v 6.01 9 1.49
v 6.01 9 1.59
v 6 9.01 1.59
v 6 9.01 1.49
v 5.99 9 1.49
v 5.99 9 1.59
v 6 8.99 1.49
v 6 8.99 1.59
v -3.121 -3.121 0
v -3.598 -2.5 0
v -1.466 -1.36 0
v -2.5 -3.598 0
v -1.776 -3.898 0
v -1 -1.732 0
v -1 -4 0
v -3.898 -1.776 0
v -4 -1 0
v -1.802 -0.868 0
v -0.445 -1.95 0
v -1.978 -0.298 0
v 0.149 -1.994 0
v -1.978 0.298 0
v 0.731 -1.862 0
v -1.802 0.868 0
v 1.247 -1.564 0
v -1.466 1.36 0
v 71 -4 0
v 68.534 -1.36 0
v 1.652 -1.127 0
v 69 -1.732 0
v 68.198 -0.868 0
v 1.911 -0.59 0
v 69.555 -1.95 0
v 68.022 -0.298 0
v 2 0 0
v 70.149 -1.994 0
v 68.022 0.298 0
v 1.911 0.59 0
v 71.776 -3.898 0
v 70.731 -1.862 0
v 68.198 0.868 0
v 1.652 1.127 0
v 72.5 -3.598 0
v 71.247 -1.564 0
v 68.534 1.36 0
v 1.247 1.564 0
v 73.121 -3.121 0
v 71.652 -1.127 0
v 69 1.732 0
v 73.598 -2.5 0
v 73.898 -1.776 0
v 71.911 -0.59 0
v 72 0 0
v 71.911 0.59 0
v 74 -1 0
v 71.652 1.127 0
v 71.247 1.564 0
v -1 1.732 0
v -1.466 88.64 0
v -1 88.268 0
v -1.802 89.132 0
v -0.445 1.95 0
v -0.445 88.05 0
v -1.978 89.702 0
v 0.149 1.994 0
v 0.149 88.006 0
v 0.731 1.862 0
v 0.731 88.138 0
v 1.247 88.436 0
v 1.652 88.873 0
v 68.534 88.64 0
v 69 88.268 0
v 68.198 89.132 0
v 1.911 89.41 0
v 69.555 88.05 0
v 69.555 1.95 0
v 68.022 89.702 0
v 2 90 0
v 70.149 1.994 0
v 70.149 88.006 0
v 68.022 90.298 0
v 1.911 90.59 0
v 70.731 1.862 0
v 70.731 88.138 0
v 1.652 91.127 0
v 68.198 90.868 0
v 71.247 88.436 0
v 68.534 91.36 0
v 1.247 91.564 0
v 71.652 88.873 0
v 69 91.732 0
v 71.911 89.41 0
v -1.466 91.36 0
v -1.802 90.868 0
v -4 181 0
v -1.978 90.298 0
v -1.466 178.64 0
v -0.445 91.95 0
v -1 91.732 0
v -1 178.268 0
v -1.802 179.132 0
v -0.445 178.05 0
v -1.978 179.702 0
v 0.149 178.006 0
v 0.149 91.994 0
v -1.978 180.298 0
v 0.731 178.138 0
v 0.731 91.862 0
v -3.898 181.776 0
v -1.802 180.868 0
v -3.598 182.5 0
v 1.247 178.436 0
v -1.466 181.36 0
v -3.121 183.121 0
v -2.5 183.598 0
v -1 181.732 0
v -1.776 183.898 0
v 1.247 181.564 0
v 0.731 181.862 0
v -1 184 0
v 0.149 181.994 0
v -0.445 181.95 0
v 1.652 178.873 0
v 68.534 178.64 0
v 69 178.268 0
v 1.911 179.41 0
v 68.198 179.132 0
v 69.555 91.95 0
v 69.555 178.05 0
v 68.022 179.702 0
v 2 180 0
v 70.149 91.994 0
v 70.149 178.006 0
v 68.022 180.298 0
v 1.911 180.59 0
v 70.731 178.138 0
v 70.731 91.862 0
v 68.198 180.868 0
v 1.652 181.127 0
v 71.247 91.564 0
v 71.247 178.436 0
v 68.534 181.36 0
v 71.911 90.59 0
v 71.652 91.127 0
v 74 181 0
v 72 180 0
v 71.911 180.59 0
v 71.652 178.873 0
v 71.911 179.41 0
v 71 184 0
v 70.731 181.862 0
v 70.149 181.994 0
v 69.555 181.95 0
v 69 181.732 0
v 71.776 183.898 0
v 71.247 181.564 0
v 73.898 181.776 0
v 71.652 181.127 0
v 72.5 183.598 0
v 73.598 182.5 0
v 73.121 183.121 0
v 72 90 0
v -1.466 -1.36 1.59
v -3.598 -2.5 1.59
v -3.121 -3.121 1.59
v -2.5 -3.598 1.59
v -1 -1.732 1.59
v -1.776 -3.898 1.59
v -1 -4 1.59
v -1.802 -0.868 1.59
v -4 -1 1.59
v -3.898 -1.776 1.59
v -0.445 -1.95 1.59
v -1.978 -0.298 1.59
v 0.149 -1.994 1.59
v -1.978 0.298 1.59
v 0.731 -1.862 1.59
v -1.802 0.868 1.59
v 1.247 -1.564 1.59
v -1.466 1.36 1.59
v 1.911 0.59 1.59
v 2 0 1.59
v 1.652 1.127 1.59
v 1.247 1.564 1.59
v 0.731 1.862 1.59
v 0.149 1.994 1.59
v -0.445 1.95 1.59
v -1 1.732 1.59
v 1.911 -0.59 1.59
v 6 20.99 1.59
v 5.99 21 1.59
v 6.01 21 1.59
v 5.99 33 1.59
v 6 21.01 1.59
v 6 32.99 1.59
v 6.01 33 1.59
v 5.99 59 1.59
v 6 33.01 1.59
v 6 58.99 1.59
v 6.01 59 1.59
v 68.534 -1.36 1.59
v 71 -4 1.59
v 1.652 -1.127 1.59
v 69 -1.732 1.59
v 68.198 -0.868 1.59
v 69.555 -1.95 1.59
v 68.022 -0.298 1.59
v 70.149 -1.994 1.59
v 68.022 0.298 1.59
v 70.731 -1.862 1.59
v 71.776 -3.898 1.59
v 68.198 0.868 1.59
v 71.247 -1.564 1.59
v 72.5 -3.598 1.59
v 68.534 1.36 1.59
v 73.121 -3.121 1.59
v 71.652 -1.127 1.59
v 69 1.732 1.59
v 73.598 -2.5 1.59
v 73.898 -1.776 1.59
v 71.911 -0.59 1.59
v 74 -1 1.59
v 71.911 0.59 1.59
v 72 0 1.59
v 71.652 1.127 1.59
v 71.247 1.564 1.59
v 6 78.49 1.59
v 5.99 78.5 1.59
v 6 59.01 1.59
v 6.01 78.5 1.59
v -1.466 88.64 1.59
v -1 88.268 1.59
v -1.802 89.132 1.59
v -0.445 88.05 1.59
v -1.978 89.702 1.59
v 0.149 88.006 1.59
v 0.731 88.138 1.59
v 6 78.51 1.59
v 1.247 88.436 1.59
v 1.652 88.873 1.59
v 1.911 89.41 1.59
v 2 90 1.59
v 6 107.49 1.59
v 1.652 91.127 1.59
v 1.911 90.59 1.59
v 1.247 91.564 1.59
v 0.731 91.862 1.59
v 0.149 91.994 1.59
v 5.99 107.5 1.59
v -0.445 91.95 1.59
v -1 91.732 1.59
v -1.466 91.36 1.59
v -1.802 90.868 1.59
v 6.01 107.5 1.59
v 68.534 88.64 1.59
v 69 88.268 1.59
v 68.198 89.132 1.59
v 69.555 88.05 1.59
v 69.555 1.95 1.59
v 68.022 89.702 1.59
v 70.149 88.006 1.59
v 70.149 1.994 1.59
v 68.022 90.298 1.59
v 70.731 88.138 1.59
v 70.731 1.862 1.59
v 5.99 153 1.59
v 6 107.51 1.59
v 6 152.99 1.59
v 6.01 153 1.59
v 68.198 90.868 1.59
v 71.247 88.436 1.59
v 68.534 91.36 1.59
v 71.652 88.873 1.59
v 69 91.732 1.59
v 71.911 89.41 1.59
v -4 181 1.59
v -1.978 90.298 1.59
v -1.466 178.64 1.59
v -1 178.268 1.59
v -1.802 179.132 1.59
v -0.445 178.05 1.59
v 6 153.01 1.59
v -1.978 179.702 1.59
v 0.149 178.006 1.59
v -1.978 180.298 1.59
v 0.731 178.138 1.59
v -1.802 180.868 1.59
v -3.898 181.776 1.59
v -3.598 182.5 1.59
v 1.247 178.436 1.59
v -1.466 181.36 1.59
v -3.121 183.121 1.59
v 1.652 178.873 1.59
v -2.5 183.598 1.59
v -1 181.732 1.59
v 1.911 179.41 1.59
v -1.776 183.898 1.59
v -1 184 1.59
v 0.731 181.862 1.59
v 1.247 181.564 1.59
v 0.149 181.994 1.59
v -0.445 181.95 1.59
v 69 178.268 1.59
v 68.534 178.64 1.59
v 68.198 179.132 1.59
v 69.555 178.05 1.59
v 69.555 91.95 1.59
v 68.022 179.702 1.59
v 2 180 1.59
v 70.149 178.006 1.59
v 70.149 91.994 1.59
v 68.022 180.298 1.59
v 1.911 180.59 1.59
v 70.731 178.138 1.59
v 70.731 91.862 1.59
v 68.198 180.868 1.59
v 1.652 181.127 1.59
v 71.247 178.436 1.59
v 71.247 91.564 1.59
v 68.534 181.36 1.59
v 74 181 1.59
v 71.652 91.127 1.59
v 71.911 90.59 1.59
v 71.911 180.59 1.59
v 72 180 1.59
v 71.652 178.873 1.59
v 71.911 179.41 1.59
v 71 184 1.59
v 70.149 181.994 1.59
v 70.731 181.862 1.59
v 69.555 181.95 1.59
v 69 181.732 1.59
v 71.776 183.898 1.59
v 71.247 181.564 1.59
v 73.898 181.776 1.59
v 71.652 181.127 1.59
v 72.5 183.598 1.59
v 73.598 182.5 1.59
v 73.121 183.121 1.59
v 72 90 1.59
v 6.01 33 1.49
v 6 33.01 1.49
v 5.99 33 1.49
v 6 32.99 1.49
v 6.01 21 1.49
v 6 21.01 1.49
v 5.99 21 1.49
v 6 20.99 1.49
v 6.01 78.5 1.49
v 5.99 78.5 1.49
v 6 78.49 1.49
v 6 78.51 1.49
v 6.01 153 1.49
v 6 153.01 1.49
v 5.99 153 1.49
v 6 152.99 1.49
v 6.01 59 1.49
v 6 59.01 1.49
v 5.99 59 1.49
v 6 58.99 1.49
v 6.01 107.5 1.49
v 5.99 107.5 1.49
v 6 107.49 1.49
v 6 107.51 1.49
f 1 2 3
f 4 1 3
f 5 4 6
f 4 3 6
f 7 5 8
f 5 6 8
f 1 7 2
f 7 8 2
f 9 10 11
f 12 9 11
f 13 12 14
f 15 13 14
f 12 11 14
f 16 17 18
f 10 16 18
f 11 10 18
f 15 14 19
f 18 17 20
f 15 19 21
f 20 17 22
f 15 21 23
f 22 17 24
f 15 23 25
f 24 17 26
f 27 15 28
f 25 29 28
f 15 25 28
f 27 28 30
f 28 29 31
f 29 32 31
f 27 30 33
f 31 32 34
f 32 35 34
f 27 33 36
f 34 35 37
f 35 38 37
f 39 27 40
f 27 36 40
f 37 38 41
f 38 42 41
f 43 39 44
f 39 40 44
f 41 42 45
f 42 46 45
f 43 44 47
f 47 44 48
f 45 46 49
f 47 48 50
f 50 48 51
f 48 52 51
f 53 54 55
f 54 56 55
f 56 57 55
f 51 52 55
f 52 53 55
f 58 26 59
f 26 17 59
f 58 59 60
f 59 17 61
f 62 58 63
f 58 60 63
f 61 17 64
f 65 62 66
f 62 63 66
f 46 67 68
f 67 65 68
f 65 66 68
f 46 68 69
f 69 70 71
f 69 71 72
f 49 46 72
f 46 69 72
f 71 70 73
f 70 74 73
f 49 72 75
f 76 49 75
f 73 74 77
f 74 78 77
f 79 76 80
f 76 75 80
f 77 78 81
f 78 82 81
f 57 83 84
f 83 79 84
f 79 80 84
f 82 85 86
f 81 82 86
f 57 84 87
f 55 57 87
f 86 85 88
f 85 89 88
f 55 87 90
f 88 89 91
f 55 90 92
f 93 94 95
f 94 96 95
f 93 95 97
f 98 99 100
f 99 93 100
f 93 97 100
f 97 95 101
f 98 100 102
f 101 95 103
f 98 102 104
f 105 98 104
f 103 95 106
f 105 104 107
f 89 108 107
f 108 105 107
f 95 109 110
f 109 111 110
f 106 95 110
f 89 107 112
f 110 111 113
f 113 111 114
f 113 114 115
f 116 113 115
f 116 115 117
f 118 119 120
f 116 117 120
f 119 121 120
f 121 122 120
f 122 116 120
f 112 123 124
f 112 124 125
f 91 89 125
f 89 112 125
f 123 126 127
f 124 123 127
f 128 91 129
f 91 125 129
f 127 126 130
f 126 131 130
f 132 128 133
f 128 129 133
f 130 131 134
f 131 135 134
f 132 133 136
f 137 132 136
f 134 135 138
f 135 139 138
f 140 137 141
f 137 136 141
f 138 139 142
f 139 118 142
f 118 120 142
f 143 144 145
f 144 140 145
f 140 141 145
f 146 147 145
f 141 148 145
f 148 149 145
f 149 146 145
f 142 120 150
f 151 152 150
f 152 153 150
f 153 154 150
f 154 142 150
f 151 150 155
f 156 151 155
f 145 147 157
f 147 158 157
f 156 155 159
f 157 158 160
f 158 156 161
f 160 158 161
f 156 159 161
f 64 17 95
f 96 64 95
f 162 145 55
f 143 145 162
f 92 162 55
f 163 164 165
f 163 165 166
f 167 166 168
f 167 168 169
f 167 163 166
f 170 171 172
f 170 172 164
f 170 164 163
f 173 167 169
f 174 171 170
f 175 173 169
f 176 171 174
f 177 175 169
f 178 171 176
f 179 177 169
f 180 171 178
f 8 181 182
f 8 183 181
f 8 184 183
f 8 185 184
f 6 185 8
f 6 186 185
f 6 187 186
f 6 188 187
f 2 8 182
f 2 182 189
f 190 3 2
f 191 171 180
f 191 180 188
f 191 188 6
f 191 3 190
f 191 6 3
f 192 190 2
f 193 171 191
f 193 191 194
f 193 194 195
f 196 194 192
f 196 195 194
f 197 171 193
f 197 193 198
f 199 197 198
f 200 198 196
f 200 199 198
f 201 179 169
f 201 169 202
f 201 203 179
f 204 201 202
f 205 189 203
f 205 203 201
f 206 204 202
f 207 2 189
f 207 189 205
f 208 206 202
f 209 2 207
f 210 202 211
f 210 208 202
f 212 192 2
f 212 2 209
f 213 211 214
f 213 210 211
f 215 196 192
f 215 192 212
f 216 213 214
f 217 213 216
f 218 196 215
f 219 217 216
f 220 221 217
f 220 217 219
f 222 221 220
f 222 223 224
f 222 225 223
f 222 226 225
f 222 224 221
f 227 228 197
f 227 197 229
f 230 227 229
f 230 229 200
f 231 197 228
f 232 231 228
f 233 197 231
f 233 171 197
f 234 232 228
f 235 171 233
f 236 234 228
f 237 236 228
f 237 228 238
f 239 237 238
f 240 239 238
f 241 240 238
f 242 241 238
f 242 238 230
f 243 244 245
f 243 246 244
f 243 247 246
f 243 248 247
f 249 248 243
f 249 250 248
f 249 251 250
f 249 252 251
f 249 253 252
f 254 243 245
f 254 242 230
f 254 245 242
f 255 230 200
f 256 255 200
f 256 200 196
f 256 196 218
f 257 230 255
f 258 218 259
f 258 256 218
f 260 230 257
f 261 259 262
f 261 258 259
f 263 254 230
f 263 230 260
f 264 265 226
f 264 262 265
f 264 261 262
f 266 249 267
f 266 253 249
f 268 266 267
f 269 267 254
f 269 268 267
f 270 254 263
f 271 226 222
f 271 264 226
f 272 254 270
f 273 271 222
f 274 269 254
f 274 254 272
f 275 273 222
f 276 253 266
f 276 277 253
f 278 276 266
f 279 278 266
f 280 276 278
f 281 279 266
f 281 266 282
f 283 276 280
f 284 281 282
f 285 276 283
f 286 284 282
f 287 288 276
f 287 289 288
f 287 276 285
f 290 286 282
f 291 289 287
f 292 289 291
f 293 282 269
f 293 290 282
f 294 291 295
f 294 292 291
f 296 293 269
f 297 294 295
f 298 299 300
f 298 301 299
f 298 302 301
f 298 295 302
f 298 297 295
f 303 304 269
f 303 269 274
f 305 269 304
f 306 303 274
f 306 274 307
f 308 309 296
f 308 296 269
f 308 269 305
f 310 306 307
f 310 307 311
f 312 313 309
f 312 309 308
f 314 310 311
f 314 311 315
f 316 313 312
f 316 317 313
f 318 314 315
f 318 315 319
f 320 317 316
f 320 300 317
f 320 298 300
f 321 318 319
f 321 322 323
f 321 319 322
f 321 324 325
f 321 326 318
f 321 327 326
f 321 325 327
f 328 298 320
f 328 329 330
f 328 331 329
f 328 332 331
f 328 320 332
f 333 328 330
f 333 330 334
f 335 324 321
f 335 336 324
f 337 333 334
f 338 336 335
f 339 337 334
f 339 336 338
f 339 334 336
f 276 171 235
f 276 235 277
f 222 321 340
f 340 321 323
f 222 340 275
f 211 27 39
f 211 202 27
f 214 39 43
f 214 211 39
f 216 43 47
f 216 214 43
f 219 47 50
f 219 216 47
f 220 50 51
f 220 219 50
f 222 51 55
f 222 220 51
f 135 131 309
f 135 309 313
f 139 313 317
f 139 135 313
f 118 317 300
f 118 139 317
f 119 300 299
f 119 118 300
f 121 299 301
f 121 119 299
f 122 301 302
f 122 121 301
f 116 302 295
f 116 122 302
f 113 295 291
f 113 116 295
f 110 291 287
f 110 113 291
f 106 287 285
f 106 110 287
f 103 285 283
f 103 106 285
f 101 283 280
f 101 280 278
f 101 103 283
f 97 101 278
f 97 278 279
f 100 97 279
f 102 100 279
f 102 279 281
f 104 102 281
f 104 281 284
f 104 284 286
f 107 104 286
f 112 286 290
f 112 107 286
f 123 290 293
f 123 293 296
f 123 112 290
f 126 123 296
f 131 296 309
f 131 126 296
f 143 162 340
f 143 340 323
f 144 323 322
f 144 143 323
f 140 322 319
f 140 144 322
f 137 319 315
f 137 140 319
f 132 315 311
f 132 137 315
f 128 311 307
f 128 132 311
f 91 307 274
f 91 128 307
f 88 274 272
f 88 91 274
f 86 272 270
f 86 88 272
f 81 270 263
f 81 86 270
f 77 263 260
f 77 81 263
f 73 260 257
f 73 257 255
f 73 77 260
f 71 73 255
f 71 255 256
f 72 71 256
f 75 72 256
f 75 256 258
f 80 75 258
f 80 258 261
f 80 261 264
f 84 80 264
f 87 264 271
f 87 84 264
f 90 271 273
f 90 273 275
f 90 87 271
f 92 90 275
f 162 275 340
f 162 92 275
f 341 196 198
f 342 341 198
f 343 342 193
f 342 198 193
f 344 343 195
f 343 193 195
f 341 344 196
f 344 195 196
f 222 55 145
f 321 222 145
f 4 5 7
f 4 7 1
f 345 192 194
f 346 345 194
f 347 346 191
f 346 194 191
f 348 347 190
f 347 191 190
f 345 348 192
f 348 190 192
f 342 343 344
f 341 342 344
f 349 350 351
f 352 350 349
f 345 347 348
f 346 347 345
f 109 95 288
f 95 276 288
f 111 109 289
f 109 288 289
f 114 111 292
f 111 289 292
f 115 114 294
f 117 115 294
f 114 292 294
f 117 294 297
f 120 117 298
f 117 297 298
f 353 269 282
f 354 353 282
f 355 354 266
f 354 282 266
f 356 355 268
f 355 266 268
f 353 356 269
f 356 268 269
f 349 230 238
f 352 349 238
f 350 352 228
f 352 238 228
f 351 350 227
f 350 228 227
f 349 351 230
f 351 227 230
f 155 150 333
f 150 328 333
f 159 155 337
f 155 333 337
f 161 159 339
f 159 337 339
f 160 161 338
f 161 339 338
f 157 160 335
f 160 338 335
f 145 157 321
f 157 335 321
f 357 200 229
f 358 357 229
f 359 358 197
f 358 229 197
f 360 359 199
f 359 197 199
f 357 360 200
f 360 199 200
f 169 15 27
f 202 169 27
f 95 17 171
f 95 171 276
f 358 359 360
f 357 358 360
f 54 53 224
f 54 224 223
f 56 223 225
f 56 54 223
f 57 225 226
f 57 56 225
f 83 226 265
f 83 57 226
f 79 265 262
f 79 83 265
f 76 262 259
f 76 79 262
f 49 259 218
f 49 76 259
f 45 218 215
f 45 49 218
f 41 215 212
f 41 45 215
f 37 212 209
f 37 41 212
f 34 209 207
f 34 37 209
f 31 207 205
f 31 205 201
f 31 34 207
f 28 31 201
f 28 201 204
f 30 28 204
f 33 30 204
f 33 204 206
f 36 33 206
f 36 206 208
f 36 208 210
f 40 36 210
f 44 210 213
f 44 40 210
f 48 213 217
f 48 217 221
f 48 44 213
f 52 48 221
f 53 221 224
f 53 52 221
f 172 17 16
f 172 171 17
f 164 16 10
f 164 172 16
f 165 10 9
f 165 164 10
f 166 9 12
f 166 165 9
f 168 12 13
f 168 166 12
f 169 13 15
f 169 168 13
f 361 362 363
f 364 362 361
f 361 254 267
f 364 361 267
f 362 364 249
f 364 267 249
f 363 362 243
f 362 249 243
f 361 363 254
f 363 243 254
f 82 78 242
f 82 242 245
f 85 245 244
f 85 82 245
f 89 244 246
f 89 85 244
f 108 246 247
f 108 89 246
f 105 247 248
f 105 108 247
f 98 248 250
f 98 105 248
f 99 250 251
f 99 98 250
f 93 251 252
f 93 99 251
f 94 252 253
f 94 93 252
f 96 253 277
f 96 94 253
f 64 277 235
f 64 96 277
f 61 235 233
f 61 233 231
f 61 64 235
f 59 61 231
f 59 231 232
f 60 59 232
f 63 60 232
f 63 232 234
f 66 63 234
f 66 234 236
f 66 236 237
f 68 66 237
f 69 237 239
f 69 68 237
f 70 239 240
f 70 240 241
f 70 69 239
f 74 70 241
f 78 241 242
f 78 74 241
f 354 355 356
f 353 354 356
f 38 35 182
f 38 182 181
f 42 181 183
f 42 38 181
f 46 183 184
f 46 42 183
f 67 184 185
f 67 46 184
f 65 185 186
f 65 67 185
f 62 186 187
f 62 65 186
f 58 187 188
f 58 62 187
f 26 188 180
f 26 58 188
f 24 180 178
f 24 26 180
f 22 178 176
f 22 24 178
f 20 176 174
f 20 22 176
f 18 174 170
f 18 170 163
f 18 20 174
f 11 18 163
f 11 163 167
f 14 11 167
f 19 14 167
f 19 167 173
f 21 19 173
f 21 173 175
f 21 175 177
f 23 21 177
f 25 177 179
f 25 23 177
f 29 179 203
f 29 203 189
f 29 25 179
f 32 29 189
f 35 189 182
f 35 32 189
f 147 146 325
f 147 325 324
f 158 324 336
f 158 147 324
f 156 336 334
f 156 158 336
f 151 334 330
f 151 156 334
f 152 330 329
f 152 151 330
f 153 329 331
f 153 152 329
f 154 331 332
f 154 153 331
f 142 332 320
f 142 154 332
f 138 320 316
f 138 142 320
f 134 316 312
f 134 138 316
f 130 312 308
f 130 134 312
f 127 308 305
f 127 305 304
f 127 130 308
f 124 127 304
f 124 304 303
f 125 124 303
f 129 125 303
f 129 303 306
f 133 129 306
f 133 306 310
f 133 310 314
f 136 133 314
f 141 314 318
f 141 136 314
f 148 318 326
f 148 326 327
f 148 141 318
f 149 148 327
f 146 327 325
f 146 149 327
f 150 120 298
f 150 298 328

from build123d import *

# Parameters (mm, degrees)
SKETCH_W     = 78
SKETCH_H     = 188
SKETCH_R     = 2
PAD_DEPTH    = 1.59
FILLET_R     = 3
SKETCH001_R  = 0.01
POCKET_DEPTH = 0.1


with BuildPart() as part:
    # Sketch → Pad (new body)
    with BuildSketch(Plane.XY):
        with Locations((35, 90)):
            Rectangle(SKETCH_W, SKETCH_H)
        with Locations((0, 180)):
            Circle(SKETCH_R, mode=Mode.SUBTRACT)
        with Locations((70, 180)):
            Circle(SKETCH_R, mode=Mode.SUBTRACT)
        with Locations((70, 90)):
            Circle(SKETCH_R, mode=Mode.SUBTRACT)
        with Locations((0, 90)):
            Circle(SKETCH_R, mode=Mode.SUBTRACT)
        Circle(SKETCH_R, mode=Mode.SUBTRACT)
        with Locations((70, 0)):
            Circle(SKETCH_R, mode=Mode.SUBTRACT)
    extrude(amount=PAD_DEPTH)

    # Fillet
    fillet_edges = [part.edges().sort_by_distance(p)[0] for p in [
        (-4, -4, 0.795),
        (74, -4, 0.795),
        (74, 184, 0.795),
        (-4, 184, 0.795),
    ]]
    fillet(fillet_edges, radius=FILLET_R)

    # Sketch001 (on Face5 of Fillet) → Pocket (cut)
    with BuildSketch(Plane.XY.offset(1.59)):
        with Locations((6, 153)):
            Circle(SKETCH001_R)
        with Locations((6, 107.5)):
            Circle(SKETCH001_R)
        with Locations((6, 78.5)):
            Circle(SKETCH001_R)
        with Locations((6, 59)):
            Circle(SKETCH001_R)
        with Locations((6, 33)):
            Circle(SKETCH001_R)
        with Locations((6, 21)):
            Circle(SKETCH001_R)
        with Locations((6, 9)):
            Circle(SKETCH001_R)
    extrude(amount=-POCKET_DEPTH, mode=Mode.SUBTRACT)


solid = part.part
